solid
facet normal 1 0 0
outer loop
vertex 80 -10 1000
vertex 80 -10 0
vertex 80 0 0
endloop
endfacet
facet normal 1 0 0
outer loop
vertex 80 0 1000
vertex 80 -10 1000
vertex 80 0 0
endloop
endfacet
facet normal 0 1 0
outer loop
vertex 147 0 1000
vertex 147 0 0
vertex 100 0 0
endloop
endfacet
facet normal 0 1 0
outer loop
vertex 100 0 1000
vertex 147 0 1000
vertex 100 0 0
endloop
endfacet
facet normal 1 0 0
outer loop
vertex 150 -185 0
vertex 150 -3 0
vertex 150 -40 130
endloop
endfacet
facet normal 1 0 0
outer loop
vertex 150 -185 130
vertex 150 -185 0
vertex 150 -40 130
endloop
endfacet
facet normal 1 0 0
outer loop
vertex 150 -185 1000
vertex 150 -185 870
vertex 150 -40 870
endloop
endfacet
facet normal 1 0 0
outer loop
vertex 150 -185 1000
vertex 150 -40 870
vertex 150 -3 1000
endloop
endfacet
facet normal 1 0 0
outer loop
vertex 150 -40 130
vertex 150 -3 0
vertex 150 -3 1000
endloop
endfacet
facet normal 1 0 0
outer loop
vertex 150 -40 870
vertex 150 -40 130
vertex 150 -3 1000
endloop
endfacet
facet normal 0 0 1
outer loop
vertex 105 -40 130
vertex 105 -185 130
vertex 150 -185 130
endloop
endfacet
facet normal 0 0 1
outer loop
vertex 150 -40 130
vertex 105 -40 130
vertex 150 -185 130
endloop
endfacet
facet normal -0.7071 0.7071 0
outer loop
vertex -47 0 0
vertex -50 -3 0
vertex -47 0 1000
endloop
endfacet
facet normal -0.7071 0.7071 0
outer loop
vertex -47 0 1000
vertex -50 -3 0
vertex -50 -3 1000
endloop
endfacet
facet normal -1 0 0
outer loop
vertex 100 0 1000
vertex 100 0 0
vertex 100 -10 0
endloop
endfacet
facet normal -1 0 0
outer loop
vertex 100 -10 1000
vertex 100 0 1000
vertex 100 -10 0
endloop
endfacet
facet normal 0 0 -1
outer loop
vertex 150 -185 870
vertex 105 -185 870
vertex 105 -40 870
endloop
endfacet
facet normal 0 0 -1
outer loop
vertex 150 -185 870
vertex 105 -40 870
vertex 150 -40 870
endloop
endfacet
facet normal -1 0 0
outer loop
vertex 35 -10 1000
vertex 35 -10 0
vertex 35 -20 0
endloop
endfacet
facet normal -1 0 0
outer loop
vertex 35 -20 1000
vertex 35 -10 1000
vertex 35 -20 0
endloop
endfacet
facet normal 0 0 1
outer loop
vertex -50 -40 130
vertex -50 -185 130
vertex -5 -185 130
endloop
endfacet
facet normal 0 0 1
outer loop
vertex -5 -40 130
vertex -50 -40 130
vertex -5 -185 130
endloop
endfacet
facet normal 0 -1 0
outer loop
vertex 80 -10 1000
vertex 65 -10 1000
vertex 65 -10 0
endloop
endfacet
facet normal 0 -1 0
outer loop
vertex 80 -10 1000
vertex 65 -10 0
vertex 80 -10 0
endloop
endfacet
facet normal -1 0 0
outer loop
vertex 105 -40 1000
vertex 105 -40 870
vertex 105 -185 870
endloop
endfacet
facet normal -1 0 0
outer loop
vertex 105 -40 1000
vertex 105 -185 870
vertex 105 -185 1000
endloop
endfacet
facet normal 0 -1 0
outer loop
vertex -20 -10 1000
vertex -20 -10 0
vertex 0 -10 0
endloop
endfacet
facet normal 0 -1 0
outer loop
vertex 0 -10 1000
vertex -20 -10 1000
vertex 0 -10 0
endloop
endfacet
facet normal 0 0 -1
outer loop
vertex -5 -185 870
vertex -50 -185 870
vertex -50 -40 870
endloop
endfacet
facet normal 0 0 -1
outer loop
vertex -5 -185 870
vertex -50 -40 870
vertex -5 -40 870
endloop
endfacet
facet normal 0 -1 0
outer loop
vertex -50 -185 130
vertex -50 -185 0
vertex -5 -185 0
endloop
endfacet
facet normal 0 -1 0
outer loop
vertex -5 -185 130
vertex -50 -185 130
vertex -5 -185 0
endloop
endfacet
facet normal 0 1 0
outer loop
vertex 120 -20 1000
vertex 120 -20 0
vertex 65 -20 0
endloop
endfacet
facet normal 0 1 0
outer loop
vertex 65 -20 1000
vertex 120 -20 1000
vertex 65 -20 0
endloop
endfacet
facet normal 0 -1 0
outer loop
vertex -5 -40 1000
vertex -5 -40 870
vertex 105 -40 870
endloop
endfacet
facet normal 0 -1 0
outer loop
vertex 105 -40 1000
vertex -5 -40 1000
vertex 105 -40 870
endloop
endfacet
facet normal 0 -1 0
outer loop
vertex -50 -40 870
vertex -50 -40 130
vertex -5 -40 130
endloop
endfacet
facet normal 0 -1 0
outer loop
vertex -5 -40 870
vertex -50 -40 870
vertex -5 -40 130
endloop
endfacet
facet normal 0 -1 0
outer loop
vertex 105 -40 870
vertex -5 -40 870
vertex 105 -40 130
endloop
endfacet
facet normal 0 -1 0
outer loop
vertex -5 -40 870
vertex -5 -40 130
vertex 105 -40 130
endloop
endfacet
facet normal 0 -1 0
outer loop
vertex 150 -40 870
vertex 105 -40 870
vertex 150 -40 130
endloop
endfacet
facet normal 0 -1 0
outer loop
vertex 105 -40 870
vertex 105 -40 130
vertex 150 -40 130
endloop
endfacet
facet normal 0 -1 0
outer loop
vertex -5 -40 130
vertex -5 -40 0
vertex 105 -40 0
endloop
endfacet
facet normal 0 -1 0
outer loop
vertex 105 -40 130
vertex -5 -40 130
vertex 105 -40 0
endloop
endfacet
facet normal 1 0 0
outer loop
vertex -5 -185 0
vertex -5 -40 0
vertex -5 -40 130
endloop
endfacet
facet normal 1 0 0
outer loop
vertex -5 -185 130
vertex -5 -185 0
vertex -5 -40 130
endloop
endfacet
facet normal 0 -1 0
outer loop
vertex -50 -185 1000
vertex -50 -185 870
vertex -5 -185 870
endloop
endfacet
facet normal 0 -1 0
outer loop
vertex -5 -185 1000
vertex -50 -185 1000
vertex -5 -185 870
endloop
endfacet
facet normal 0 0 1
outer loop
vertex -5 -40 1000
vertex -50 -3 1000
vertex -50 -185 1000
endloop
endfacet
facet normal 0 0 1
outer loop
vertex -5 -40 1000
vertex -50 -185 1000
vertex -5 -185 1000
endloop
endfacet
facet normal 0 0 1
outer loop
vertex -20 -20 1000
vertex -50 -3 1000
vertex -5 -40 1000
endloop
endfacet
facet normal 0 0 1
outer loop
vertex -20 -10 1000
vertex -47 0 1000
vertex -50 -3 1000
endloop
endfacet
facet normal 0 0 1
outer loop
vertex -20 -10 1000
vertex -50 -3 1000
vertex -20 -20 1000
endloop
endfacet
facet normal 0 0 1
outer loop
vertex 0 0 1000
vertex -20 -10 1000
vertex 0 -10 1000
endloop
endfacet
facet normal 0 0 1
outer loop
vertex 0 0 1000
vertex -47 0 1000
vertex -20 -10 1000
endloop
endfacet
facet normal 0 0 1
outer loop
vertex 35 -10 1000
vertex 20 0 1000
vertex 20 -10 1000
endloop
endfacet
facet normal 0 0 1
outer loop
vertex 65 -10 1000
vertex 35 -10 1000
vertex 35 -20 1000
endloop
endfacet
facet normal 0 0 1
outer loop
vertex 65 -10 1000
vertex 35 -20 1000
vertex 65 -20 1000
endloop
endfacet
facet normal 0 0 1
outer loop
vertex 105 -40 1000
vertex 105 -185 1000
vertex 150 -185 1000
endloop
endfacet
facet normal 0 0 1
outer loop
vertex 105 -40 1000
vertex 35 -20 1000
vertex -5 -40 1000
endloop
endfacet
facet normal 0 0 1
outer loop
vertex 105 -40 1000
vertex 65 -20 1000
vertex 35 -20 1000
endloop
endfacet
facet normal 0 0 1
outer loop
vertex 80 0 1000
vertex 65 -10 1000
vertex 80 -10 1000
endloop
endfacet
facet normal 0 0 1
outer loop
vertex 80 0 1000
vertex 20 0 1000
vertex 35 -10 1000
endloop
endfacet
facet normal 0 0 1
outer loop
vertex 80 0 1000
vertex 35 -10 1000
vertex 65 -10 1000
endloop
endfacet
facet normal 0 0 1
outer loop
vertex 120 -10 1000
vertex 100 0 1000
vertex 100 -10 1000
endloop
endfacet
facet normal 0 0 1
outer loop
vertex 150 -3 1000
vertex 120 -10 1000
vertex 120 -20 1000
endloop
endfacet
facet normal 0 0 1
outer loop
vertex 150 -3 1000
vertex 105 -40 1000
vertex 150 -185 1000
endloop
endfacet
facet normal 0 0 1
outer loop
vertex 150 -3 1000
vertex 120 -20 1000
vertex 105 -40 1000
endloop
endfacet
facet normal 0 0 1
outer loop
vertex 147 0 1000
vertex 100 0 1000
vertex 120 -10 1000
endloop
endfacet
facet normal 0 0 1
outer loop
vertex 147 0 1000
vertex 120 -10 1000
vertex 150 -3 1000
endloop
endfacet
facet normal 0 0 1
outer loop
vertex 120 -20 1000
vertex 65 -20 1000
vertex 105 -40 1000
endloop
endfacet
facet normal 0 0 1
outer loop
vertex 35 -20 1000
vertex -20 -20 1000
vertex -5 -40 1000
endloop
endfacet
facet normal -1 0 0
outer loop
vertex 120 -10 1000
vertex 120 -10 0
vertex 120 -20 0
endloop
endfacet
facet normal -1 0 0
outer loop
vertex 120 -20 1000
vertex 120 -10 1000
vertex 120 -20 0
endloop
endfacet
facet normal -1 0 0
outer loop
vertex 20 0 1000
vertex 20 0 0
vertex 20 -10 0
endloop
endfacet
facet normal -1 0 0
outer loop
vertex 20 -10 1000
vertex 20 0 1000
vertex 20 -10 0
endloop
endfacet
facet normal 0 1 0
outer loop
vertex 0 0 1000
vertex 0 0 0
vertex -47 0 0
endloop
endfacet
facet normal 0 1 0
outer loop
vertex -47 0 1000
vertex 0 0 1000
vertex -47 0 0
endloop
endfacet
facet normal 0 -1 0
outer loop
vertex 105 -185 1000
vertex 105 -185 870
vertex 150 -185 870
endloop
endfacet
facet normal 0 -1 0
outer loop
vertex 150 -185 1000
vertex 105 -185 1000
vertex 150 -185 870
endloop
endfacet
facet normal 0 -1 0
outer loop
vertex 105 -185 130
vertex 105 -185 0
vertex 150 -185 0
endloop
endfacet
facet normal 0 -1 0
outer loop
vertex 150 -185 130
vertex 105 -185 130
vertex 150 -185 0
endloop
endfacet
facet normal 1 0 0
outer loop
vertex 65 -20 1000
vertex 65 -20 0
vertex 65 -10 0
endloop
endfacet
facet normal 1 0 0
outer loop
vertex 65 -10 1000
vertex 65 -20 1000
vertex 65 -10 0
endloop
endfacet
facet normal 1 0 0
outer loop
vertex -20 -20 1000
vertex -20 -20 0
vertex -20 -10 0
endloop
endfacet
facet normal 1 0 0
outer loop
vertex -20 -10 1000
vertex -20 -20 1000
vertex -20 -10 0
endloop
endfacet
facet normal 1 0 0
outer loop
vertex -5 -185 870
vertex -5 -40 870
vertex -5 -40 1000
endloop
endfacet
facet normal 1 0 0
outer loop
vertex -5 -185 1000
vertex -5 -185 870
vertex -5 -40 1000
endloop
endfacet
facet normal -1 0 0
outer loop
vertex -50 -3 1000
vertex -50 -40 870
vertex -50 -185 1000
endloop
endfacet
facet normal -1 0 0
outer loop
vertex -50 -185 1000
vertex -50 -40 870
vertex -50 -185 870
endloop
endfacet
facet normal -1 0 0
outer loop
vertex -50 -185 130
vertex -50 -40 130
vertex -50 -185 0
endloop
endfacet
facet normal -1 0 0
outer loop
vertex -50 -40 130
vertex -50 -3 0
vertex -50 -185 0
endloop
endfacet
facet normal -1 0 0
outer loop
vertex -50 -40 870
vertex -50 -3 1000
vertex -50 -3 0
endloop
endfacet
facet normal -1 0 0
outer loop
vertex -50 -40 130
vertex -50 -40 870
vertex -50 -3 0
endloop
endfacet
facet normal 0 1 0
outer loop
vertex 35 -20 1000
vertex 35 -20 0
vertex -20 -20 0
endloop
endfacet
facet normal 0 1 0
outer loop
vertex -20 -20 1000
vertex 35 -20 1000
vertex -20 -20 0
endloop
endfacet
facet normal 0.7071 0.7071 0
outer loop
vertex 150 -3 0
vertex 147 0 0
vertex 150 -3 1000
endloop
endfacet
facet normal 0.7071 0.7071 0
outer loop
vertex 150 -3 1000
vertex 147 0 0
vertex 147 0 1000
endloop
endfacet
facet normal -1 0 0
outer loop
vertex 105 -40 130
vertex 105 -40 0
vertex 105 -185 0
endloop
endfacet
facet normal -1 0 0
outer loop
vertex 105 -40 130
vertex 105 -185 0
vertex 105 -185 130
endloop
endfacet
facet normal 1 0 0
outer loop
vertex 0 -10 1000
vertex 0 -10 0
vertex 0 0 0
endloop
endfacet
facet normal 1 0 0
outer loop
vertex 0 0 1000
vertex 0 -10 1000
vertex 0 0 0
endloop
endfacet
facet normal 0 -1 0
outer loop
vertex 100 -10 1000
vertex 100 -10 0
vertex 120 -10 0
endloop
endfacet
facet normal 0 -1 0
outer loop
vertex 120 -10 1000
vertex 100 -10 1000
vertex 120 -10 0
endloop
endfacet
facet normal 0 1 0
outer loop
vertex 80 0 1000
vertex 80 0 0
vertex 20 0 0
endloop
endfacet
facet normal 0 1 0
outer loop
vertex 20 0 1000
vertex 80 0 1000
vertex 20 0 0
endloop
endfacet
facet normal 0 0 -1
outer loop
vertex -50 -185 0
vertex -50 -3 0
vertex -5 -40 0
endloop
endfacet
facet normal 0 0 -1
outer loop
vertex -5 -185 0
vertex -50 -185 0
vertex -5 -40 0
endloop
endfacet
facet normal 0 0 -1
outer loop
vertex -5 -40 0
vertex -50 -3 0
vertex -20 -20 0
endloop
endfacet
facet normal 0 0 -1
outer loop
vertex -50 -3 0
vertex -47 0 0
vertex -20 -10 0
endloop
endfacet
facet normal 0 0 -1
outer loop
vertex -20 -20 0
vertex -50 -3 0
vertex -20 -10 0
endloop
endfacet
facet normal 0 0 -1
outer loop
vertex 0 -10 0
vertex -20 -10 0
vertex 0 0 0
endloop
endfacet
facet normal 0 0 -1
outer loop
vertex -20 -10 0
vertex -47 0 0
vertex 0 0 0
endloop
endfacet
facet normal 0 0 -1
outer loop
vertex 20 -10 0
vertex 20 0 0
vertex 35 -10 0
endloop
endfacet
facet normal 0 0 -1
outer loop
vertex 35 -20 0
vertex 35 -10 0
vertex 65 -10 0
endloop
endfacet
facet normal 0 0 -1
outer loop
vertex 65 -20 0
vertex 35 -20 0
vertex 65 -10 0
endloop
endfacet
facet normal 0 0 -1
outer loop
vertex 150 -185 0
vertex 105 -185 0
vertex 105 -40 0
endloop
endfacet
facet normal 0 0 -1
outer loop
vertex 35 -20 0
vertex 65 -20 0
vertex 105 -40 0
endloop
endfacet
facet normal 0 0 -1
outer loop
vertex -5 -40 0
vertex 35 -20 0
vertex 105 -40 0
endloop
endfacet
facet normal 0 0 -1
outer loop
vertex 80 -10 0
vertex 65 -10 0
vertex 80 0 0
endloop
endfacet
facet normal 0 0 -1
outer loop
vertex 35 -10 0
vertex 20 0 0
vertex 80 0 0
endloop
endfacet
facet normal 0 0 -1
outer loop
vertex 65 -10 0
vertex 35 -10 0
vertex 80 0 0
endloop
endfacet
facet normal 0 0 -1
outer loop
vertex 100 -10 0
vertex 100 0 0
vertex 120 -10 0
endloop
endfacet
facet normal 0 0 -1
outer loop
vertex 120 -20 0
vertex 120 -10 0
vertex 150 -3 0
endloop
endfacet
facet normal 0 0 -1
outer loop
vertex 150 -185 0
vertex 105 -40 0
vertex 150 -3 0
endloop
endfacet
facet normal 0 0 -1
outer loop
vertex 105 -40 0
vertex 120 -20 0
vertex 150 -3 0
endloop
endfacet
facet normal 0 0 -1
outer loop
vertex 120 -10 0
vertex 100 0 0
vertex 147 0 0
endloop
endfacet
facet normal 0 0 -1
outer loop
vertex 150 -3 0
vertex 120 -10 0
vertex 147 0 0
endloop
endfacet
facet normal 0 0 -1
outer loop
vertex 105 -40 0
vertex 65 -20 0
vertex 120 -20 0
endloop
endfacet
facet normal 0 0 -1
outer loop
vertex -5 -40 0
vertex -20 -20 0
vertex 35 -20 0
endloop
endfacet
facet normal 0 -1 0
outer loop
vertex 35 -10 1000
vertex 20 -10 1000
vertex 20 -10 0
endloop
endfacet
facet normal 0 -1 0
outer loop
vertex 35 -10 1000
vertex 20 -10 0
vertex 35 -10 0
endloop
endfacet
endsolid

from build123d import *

# Parameters (mm, degrees)
BOSS_EXTRUDE1_DEPTH = 1000
SKETCH2_W           = 45
SKETCH2_H           = 130
BOSS_EXTRUDE2_DEPTH = 145
CHAMFER1_SIZE       = 3


with BuildPart() as part:
    # Sketch1 → Boss-Extrude1 (new body)
    with BuildSketch(Plane.XY):
        Polygon((-8.548454956, 0), (-50, 0), (-50, -40), (150, -40), (150, 0), (131.451545044, 0), (100, 0), (100, -10), (120, -10), (120, -20), (65, -20), (65, -10), (80, -10), (80, 0), (77.428634929, 0), (47.428634929, 0), (20, 0), (20, -10), (35, -10), (35, -20), (-20, -20), (-20, -10), (0, -10), (0, 0), align=None)
    extrude(amount=BOSS_EXTRUDE1_DEPTH)

    # Sketch2 → Boss-Extrude2 (add)
    with BuildSketch(Plane.XZ.offset(40)):
        with Locations((127.5, 935)):
            Rectangle(SKETCH2_W, SKETCH2_H)
        with Locations((-27.5, 935)):
            Rectangle(SKETCH2_W, SKETCH2_H)
        with Locations((127.5, 65)):
            Rectangle(SKETCH2_W, SKETCH2_H)
        with Locations((-27.5, 65)):
            Rectangle(SKETCH2_W, SKETCH2_H)
    extrude(amount=BOSS_EXTRUDE2_DEPTH)

    # Chamfer1
    chamfer1_edges = [part.edges().sort_by_distance(p)[0] for p in [
        (150, 0, 500),
        (-50, 0, 500),
    ]]
    chamfer(chamfer1_edges, length=CHAMFER1_SIZE)


solid = part.part
